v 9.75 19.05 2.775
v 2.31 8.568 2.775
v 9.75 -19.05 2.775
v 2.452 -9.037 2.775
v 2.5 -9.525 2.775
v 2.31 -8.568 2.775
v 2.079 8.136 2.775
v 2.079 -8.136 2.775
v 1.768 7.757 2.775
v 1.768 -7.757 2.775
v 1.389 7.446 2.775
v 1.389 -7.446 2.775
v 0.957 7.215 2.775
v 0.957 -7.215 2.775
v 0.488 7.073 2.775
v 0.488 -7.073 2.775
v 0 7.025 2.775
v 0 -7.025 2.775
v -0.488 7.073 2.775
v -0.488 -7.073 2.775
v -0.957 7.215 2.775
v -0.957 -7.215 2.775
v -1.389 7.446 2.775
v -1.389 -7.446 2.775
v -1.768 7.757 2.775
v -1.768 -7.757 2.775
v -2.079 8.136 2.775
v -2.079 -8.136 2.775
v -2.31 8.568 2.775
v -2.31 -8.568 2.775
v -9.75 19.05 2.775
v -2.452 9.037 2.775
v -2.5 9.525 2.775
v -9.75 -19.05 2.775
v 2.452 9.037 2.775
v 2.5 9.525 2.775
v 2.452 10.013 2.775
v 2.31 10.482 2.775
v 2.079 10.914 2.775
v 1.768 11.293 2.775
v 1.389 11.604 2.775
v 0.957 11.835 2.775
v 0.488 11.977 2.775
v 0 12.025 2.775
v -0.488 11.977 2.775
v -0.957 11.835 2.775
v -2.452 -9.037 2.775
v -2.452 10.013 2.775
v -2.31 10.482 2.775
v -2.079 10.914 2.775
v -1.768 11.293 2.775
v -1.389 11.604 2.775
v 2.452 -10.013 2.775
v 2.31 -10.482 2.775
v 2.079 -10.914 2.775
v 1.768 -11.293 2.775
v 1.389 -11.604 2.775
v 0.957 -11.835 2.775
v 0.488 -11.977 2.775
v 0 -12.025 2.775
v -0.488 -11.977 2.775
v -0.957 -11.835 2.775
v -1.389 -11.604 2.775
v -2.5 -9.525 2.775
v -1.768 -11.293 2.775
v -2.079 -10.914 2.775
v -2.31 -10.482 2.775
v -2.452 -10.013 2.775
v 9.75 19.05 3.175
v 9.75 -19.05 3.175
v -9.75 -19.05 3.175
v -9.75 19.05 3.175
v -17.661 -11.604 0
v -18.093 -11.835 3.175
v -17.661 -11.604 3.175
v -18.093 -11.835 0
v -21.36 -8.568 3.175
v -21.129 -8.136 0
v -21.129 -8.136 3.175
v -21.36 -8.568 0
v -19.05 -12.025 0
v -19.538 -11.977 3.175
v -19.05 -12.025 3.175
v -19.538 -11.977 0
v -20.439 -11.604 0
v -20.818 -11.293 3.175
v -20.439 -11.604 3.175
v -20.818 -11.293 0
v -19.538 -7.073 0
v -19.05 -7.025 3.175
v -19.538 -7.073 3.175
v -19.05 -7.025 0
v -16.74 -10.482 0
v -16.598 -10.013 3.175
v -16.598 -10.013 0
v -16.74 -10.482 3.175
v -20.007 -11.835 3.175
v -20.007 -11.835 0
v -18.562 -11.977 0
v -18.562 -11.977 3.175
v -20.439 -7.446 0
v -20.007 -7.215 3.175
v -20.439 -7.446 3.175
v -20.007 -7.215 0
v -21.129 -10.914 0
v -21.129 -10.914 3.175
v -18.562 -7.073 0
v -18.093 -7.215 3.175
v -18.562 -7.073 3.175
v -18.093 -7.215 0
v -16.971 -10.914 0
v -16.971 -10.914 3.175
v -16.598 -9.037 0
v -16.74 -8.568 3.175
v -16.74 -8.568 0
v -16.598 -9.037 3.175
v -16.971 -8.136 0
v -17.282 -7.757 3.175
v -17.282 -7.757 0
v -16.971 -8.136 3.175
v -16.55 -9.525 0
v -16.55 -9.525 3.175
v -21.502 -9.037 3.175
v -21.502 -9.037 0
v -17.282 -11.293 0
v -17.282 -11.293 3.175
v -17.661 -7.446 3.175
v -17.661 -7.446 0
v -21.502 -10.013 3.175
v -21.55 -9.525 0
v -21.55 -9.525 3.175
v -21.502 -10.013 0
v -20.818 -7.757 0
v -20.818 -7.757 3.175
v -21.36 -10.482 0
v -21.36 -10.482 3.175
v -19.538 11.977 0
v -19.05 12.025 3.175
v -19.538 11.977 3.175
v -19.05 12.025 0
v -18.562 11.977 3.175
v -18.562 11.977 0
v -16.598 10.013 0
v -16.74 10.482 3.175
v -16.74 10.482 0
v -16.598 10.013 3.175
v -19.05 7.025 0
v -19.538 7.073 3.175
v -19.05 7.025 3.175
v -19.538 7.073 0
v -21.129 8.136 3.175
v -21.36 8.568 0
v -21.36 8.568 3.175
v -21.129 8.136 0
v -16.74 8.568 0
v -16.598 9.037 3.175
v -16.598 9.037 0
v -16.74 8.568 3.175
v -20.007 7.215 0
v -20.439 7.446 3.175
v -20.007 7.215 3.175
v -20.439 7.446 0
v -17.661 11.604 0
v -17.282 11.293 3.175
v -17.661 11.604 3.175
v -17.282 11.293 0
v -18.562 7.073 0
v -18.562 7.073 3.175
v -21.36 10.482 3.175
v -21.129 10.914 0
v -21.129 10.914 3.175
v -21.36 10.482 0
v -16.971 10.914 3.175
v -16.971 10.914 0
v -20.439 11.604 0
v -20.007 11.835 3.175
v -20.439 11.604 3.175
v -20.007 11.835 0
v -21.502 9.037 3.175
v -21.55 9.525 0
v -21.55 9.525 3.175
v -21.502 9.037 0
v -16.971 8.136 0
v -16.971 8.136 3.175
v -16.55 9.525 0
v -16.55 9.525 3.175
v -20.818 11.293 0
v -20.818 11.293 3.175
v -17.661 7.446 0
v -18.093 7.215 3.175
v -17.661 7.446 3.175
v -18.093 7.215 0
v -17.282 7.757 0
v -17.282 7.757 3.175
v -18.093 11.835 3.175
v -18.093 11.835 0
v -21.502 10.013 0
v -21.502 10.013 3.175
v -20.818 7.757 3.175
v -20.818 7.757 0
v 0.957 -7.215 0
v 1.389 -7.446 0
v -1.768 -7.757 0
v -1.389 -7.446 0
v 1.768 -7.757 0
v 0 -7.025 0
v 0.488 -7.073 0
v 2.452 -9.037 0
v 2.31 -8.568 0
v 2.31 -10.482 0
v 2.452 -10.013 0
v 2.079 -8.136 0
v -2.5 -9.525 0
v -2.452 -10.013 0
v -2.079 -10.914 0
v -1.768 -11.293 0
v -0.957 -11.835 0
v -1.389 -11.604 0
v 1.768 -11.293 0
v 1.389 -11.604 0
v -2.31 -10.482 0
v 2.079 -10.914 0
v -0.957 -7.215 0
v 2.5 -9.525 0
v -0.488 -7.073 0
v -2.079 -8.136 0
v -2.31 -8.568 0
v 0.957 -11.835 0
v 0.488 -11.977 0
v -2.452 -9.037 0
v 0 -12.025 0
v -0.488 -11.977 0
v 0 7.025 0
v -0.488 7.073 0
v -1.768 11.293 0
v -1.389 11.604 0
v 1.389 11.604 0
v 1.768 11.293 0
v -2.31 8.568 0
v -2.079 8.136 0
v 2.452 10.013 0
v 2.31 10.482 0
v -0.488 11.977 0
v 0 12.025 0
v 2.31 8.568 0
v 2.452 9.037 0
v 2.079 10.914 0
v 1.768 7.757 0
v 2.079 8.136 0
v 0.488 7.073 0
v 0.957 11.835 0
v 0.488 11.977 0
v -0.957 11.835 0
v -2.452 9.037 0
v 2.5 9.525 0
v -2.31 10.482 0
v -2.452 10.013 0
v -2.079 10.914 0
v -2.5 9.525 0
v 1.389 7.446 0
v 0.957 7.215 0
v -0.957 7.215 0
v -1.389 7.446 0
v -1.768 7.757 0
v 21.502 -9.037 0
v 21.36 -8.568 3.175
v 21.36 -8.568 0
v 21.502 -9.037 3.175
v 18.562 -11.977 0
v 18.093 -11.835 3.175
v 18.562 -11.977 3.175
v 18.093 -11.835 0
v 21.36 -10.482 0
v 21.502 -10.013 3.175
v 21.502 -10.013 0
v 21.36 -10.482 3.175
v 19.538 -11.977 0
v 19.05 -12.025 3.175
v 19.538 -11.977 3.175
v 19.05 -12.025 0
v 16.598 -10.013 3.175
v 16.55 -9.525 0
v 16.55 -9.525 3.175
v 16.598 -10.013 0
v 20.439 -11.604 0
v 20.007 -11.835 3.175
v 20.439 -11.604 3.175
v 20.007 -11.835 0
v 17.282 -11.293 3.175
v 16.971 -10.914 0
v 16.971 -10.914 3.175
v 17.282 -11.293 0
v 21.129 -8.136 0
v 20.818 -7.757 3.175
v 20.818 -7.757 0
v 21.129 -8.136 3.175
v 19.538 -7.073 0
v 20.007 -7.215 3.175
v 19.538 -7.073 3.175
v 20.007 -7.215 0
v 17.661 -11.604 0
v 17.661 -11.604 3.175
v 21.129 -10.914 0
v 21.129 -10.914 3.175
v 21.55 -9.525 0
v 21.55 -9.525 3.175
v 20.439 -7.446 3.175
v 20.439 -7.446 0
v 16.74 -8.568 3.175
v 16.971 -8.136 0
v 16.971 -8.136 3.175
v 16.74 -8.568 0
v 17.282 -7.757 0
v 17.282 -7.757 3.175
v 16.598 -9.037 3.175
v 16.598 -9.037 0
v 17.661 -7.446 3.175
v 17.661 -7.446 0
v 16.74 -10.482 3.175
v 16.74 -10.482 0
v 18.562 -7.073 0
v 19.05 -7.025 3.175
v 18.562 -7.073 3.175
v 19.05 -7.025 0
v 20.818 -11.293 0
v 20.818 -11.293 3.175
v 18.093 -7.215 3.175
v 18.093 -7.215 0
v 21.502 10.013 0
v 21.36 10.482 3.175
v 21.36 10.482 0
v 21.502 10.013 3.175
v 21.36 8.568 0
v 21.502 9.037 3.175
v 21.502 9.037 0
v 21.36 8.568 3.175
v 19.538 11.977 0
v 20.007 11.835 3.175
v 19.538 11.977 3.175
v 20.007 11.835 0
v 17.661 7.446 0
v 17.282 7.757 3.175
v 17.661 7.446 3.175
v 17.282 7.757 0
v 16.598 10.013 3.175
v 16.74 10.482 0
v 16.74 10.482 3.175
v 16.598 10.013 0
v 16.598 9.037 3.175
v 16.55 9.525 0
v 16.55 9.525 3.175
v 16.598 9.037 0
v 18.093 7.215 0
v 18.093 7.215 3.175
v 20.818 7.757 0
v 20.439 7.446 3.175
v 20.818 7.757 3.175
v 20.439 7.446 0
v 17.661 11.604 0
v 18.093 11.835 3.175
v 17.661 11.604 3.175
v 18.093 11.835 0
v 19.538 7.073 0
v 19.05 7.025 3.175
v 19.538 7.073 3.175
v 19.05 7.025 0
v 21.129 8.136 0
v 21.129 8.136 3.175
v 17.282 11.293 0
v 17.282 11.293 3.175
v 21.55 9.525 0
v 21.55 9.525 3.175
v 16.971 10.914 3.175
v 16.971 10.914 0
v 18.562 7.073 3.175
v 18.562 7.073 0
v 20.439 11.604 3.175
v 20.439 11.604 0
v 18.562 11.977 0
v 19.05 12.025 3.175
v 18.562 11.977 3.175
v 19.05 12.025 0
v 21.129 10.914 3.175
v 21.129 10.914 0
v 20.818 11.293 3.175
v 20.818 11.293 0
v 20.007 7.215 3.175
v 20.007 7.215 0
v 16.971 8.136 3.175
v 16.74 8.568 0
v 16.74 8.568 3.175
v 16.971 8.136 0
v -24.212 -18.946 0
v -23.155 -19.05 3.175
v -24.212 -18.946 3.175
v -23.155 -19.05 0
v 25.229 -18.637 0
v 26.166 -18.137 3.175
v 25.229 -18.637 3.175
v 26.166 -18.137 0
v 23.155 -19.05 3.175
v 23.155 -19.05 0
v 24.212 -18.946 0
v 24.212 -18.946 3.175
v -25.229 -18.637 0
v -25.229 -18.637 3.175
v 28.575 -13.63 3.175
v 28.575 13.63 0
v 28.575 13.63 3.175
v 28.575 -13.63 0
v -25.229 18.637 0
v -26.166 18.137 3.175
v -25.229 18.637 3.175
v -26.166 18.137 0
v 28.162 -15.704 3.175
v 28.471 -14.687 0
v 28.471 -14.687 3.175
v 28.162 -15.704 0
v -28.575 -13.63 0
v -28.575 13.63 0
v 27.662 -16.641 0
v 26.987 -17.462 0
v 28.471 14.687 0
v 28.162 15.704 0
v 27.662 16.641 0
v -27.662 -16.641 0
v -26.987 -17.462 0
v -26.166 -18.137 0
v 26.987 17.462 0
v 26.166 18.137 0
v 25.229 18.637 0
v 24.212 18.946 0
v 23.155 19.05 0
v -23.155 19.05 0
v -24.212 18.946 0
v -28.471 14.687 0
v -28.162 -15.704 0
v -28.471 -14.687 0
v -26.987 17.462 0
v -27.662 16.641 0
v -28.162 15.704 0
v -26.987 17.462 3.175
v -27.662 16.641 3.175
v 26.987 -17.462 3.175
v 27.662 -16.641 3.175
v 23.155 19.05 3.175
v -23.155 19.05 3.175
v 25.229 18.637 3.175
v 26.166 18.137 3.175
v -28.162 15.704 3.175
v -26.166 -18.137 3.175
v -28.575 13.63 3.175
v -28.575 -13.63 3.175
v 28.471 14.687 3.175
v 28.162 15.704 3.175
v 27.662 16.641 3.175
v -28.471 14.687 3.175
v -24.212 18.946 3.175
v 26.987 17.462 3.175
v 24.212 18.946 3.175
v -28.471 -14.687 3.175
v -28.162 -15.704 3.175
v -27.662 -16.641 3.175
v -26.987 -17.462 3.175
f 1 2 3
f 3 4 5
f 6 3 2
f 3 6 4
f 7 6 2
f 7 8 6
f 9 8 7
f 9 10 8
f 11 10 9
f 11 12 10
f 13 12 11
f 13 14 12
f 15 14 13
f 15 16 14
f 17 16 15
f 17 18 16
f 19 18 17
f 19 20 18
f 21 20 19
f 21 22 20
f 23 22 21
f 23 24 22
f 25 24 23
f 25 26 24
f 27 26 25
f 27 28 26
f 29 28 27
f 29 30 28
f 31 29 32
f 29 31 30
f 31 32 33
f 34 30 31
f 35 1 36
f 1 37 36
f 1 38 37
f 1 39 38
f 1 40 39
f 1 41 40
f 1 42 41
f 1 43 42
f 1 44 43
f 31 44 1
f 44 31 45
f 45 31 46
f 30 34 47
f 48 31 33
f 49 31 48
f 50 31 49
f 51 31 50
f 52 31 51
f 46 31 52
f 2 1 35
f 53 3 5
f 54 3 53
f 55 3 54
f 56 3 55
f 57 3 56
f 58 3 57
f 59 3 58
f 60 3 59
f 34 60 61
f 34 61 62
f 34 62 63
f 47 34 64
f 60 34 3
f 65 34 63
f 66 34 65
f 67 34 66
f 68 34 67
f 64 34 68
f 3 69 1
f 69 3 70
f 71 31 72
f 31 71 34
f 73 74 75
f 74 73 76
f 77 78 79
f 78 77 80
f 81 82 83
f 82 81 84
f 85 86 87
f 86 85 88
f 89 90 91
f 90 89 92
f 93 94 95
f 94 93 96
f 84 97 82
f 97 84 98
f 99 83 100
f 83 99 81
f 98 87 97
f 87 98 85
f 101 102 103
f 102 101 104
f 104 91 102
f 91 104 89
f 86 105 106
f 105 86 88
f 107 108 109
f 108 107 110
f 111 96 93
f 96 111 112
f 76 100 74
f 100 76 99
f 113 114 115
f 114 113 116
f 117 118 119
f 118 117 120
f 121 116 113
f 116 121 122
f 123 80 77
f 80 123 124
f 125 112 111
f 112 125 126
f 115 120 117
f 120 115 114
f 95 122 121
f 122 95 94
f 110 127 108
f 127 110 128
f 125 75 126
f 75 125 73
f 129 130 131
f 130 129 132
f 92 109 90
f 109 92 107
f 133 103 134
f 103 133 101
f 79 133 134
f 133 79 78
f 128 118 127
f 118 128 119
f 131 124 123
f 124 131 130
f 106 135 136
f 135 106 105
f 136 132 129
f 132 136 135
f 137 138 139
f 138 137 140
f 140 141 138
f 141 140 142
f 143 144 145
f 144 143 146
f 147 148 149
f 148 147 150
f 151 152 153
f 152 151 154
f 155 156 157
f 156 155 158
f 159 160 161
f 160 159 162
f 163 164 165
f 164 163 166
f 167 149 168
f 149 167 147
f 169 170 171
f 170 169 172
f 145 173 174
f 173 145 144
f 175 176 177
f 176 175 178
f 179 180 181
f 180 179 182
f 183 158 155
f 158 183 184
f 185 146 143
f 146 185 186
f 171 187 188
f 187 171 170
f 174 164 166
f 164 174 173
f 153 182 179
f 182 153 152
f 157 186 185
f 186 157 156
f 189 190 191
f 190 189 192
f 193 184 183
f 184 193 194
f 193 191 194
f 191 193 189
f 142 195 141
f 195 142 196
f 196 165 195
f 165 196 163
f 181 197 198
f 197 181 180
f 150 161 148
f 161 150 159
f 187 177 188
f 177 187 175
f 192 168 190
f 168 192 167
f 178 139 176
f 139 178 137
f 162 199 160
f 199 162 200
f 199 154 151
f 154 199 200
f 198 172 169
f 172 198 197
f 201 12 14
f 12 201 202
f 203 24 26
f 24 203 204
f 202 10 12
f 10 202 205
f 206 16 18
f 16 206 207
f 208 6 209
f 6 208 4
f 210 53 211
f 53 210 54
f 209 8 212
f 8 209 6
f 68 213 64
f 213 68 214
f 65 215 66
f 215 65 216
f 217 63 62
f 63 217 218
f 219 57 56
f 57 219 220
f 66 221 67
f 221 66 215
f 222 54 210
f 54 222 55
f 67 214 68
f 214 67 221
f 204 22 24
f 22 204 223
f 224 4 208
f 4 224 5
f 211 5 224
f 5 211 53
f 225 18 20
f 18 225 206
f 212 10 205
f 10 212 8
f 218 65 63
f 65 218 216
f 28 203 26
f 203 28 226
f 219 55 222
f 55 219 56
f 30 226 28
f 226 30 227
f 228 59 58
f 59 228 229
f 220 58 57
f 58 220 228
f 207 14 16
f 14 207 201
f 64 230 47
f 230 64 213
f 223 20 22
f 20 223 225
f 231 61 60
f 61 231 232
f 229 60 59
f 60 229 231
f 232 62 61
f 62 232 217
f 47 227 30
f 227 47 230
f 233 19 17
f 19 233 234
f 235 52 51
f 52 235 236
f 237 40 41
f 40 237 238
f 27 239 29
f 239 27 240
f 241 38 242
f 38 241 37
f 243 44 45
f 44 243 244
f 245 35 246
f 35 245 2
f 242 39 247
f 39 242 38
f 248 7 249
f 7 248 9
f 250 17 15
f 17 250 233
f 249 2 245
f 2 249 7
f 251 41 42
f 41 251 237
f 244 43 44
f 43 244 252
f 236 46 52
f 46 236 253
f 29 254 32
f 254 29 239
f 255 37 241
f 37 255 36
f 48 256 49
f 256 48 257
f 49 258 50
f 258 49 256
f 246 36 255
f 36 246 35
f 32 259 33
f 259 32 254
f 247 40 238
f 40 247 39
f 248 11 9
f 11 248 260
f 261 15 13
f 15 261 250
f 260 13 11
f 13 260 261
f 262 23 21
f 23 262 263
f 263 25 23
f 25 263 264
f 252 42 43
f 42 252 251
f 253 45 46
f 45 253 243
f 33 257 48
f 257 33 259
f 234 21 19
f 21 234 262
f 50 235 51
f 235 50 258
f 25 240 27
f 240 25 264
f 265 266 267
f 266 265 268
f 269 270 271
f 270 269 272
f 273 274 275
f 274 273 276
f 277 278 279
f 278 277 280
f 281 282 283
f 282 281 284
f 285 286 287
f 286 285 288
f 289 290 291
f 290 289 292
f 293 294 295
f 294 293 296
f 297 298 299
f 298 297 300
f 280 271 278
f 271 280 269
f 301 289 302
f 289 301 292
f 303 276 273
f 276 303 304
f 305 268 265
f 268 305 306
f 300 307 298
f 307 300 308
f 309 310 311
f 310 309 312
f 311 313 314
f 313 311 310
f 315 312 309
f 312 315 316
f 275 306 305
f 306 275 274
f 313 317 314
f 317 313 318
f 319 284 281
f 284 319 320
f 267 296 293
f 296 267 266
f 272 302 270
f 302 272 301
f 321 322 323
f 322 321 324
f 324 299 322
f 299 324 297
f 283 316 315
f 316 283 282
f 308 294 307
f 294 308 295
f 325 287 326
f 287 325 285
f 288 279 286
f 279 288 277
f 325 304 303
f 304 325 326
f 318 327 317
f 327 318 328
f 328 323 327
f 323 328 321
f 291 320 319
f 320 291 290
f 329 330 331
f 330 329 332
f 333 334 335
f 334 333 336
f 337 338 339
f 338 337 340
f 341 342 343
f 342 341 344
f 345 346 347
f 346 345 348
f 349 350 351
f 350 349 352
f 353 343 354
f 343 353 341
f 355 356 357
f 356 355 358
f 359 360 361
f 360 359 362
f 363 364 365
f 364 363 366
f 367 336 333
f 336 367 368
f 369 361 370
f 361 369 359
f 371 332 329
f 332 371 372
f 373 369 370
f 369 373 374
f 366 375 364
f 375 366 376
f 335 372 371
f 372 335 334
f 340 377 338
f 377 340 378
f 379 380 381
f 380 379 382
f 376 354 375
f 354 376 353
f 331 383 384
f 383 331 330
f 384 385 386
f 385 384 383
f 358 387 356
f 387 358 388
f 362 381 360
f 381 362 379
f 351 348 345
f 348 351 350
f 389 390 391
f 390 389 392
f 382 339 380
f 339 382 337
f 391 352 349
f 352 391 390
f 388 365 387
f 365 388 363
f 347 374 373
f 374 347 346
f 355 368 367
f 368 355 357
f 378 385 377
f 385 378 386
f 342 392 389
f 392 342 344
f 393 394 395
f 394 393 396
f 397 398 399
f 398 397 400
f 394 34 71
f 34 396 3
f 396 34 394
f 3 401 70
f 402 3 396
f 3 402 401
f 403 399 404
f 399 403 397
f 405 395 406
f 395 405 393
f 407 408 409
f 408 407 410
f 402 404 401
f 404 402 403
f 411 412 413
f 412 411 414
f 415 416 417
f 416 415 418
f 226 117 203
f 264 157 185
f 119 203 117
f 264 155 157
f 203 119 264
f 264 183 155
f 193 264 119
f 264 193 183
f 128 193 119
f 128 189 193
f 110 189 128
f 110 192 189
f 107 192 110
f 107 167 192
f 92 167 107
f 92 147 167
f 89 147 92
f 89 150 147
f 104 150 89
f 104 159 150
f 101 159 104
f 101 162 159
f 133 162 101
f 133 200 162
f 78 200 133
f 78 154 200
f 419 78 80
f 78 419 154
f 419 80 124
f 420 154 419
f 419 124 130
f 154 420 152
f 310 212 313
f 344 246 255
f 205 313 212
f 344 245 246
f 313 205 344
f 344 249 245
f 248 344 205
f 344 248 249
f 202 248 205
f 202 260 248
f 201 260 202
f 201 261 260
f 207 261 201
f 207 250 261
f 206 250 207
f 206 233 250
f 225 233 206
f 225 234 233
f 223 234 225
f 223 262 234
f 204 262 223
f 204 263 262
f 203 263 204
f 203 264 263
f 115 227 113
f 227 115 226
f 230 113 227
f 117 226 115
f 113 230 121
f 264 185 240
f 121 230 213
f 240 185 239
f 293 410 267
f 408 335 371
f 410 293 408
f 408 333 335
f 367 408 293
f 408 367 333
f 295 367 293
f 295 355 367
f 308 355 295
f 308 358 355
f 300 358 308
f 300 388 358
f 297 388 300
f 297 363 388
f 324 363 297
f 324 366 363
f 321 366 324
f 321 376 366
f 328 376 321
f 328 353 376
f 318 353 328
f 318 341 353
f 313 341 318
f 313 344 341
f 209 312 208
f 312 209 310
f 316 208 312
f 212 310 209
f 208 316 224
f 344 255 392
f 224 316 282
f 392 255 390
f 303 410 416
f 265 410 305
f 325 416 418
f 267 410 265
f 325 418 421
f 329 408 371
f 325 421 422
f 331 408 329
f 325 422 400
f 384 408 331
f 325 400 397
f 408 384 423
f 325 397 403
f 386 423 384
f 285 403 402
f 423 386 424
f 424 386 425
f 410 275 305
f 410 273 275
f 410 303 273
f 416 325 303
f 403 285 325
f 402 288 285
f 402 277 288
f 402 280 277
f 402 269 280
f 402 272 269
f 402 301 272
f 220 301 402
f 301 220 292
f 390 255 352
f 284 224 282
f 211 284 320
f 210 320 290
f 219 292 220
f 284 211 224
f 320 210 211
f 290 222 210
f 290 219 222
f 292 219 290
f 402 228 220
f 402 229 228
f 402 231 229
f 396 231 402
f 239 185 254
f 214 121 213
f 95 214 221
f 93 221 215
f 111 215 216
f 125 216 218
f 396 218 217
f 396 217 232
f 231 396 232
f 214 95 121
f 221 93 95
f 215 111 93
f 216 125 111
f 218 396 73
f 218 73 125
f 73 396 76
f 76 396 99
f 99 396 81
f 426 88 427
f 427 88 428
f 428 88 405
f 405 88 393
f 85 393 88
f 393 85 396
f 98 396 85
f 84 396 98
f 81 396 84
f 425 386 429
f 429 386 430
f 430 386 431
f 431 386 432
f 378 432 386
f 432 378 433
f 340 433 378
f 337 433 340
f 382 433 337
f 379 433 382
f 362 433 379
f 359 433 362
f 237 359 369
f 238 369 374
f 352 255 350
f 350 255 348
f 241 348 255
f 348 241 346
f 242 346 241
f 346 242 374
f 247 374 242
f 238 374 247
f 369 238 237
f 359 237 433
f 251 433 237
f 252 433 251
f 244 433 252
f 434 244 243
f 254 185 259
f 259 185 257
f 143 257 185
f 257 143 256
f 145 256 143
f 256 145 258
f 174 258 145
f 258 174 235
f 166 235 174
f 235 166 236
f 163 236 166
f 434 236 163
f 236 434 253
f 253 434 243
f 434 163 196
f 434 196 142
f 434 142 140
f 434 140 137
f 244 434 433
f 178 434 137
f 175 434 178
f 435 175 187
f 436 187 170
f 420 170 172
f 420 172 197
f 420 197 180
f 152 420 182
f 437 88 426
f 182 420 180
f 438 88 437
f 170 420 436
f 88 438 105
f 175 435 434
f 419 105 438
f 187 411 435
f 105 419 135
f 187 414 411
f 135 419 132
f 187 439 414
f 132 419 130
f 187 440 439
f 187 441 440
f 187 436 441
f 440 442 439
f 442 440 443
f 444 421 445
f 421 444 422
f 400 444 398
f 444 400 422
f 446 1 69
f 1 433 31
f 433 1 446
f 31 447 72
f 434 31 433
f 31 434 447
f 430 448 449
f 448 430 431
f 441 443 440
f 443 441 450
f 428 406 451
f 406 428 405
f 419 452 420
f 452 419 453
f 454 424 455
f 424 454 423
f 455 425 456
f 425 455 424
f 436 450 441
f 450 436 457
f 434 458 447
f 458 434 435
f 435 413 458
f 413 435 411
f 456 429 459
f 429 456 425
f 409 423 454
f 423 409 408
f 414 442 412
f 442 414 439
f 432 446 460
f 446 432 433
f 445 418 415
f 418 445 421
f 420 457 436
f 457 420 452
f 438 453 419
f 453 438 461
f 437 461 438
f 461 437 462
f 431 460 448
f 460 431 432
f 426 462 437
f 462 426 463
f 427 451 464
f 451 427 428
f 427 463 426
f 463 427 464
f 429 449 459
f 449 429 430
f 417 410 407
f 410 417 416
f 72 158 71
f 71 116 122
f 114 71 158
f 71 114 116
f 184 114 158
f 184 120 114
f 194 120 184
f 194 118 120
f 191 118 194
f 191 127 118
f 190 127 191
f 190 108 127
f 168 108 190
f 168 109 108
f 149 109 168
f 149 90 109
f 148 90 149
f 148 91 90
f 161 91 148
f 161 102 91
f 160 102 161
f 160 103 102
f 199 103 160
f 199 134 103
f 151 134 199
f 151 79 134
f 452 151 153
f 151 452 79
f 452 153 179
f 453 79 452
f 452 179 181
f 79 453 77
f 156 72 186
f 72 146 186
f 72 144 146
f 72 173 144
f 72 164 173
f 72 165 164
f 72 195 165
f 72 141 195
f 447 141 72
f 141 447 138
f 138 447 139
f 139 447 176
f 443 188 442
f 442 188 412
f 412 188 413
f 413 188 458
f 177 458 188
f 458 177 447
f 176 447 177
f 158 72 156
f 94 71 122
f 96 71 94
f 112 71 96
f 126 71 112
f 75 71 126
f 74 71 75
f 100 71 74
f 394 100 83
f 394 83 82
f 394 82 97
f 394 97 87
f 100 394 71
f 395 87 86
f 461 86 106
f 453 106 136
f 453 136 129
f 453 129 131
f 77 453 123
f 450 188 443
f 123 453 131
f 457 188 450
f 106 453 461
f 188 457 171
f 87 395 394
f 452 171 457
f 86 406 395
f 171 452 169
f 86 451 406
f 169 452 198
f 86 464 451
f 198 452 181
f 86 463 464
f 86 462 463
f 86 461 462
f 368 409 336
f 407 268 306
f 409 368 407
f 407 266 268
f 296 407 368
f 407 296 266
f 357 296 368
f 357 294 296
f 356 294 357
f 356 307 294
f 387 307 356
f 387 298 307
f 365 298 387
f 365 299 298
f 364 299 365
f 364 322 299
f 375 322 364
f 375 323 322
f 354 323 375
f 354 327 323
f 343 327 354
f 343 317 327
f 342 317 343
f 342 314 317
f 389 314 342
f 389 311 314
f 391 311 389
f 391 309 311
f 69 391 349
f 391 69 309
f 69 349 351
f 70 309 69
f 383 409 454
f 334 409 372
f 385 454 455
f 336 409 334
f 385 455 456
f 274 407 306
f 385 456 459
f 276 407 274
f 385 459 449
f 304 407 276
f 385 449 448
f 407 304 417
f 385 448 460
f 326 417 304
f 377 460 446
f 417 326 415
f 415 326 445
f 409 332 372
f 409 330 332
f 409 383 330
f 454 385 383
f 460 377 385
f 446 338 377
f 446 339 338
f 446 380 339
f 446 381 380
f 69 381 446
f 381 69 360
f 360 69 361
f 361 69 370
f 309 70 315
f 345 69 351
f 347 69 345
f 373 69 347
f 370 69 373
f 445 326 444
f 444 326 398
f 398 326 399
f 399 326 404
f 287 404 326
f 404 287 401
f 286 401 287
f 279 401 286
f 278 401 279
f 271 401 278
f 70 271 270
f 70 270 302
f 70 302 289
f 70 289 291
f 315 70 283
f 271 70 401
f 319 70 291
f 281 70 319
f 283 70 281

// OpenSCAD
// file: ../lib/TOGComplexLib1.scad
function tcplx1_multiply(a, b) =
	[a[0]*b[0] - a[1]*b[1], a[0]*b[1] + a[1]*b[0]];
function tcplx1_divide(a, b) =
	let(bot = (b[0]*b[0] + b[1]*b[1]))
	[
		(a[0]*b[0] + a[1]*b[1])/bot,
		(a[1]*b[0] - a[0]*b[1])/bot
	];

assert([-11,23] == tcplx1_multiply([3,2], [1,7]));

assert([-1,3] == tcplx1_multiply([3,1], [0,1]));
assert([-1,3] == tcplx1_multiply([0,1], [3,1]));

echo(tcplx1_divide([-1,3], [3,1]));
assert([0,1] == tcplx1_divide([-1,3], [3,1]));

function tcplx1_normalize(vec) =
	let(veclen = sqrt(vec[0]*vec[0]+vec[1]*vec[1]))
	[vec[0] / veclen, vec[1] / veclen];

function tcplx1_relative_turnvec_vv(v0, v1) =
	tcplx1_divide(tcplx1_normalize(v1), tcplx1_normalize(v0));

function tcplx1_relative_turnvec_abc(p0, p1, p2) = tcplx1_relative_turnvec_vv(p1-p0, p2-p1);

// A 90-degree turn
assert([0,1] == tcplx1_relative_turnvec_abc([0,0], [1,0], [1,1]));
assert([0,1] == tcplx1_relative_turnvec_abc([0,0], [0,1], [-1,1]));

// A 45-degree turn
assert(tcplx1_normalize([1,1]) == tcplx1_relative_turnvec_abc([0,0], [1,0], [ 2,1]));
assert(tcplx1_normalize([1,1]) == tcplx1_relative_turnvec_abc([0,0], [0,1], [-1,2]));


function tcplx1_relative_angle_abc(p0, p1, p2) =
	let(turnvec = tcplx1_relative_turnvec_abc(p0, p1, p2))
	atan2(turnvec[1], turnvec[0]);

assert(-135 == tcplx1_relative_angle_abc([0,0], [1,0], [0,-1]));
assert( -90 == tcplx1_relative_angle_abc([0,0], [1,0], [1,-1]));
assert(   0 == tcplx1_relative_angle_abc([0,0], [1,0], [2, 0]));
assert(  90 == tcplx1_relative_angle_abc([0,0], [1,0], [1, 1]));
assert( 135 == tcplx1_relative_angle_abc([0,0], [1,0], [0, 1]));

assert(  90 == tcplx1_relative_angle_abc([1,1], [3,3], [1, 5]));
// file: ../lib/TOGArrayLib1.scad
// TOGArrayLib1.5
// 
// Functions for working with arrays.
// 
// v1.1:
// - tal1_reduce assert(is_list(items)) to prevent infinite recursion
//   when given undefined or other non-list values
// v1.1.1:
// - Fix tal1_uniq_remap_v2 to return "list-remap-result" as the
//   first element of the returned list
// v1.2:
// - Add tal1_replace_at function
// v1.3:
// - tal1_is_vec_of, tal1_is_vec_of_num
// v1.4:
// - tal1_assert_for_each, for when you want to assert something
//   about each of a list of items and get nice failure messages
// v1.5:
// - Add tal1_duplicate_reversed function, which may be
//   handy when generating symmetrical polygons and stuff.

/**
 * Make a list with the contents of list `a`,
 * but starting at offset `off`, replaced by the contents of list `b`.
 * len(result) = max(len(a), off+len(b))
 */
function tal1_replace_at(a, off, b, default_value=undef, default_value_function=undef) =
	assert(is_list(a))
	assert(is_list(b))
	let( _dvf = !is_undef(default_value_function) ? default_value_function : function(i) default_value )
[
	for( i=[0:1:min(off,len(a))-1] ) a[i],
	for( i=[len(a):1:off-1] ) _dvf(i),
	for( i=[off:1:off+len(b)-1] ) b[i-off],
	for( i=[off+len(b):1:len(a)-1] ) a[i],
];

// Simplest case
assert([] == tal1_replace_at([], 0, []));
// Second simplest cases
assert(["foo"] == tal1_replace_at(["foo"], 0, []));
assert(["foo"] == tal1_replace_at([], 0, ["foo"]));
// Replace one item
assert(["foo","quux","baz"] == tal1_replace_at(["foo","bar","baz"], 1, ["quux"]));
// Replace and extend
assert(["foo","quux","tuna","tina"] == tal1_replace_at(["foo","bar","baz"], 1, ["quux", "tuna", "tina"]));
// Add beyond end of `a`
assert(["foo","zzz","quux"] == tal1_replace_at(["foo"], 2, ["quux"], default_value="zzz"));
// Adding 'nothing' should still fill to that point with defaults
assert(["foo","zzz","zzz"] == tal1_replace_at(["foo"], 3, [], default_value="zzz"));


function tal1_reduce(start, items, func, offset=0) =
	assert(is_list(items))
	len(items) == offset ? start :
	tal1_reduce(func(start, items[offset]), items, func, offset+1);

function tal1_consecutive_duplicate_count(items) = tal1_reduce(
	[0, undef],
	items,
	function(z,item) [z[0] + (item == z[1] ? 1 : 0), item]
)[0];

assert(0 == tal1_consecutive_duplicate_count([]));
assert(0 == tal1_consecutive_duplicate_count([50]));
assert(1 == tal1_consecutive_duplicate_count([50,50]));
assert(0 == tal1_consecutive_duplicate_count([50,51,52,53]));
assert(1 == tal1_consecutive_duplicate_count([50,51,52,52]));
assert(3 == tal1_consecutive_duplicate_count([50,50,50,50]));

// Set test_size to arbirarily large values
// to ensure that OpenSCAD can handle heavy recursion
let(test_size=1000) assert(test_size/2 == tal1_consecutive_duplicate_count([for(i=[0:1:test_size-1]) floor(i/2)]));



function tal1_uniq_(items, off0, off1) =
	let(chunklen = off1-off0)
	chunklen == 0 ? [] :
	chunklen == 1 ? [items[off0]] :
	let(half=floor(chunklen/2))
	let(left  = tal1_uniq_(items, off0     , off0+half))
	let(right = tal1_uniq_(items, off0+half, off1     ))
	assert(len(left) > 0)
	assert(len(right) > 0)
	left[len(left)-1] == right[0] ? [each left, for(i=[1:1:len(right)-1]) right[i]] :
	[each left, each right];

/** Given a list of items, returns a new list with identical consecutive items merged */
function tal1_uniq(items) = tal1_uniq_(items, 0, len(items));

assert([] == tal1_uniq([]));
assert([123] == tal1_uniq([123]));
assert([55,0,1,2,3] == tal1_uniq([55,0,1,2,3]));
assert([55,0,1,2] == tal1_uniq([55,0,1,1,2]));
assert([55,0,1] == tal1_uniq([55,55,0,0,0,0,0,0,1,1,1,1]));
assert([55,0] == tal1_uniq([55,0,0,0,0,0,0,0]));



/**
 * Returns [new items, old index -> new index mapping].
 * No-op version.
 */
function tal1_uniq_remap_v1(items) =
	["list-remap-result", items, [for (vi=[0:1:len(items)-1]) vi]];

// [a, a, b, b, c, c]
//
// [a,    ...], []  -> [a],[0]
// [a, a, ...], [0] -> [a],[0,0]

assert([1,2,3] == [1,2,3]);

/**
 * Recursive version that will combine adjacent identical vertexes,
 * but will use the original items.
 */
function tal1_uniq_remap_v2(items, map=[]) =
	let(index = len(map))
	len(items) == index ? ["list-remap-result", items, map] :
	index == 0 ? tal1_uniq_remap_v2(items, [0]) :
	items[index] == items[map[index-1]] ? tal1_uniq_remap_v2(items, [for(vi=map) vi, map[index-1]]) :
	tal1_uniq_remap_v2(items, [for(vi=map) vi, index]);

assert(tal1_uniq_remap_v2([1,1,2,2,3,4]) == ["list-remap-result", [1,1,2,2,3,4], [0,0,2,2,4,5]]);


/**
 * Returns true if `vec` is a list of at least min_len items
 * and component_check(each item, even those beyond min_len) is true.
 */
function tal1_is_vec_of(vec, min_len=0, component_check=function(x) true) =
	assert(is_num(min_len) && min_len >= 0)
	assert(is_function(component_check))
	is_list(vec) && len(vec) >= min_len &&
	tal1_reduce(true, vec, function(prev,item) prev && component_check(item));

function tal1_is_vec_of_num(vec, min_len=0) = tal1_is_vec_of(vec, min_len, function(i) is_num(i));

assert( true == tal1_is_vec_of_num([1,2,3]));
assert( true == tal1_is_vec_of_num([]));
assert( true == tal1_is_vec_of_num([1,2,3], 3));
assert(false == tal1_is_vec_of_num([1,2], 3));
assert(false == tal1_is_vec_of_num([1,2,"spoon"], 3));
// Requirements are ambiguous when
// first min_len items are numbers, but there are non-numeric items afterwards,
// so let's error on the side of saying 'no, it's not a list of numbers';
// i.e. the item check and the min_len are independent.
assert(false == tal1_is_vec_of_num([1,2,3,"artichoke"], 3));


/**
 * Asserts that item_checker(each item in list, index of item)[0] is true.
 * Second element of item_checker return value is assertion message.
 * Returns the original list, in case that's useful to you.
 */
function tal1_assert_for_each(list, item_checker) =
	let( _ignored = [ for(i=[0:1:len(list)-1])
		let(q=item_checker(list[i],i))
		let(passed=is_bool(q) ? q : is_list(q) ? q[0] : assert(false, str(
			"tal1_assert_for_each: item_checker should return Bool|[Bool,String], but returned ",
			q, " for item at index ", i)))
		let(message=is_list(q) ? q[1] : undef)
		assert(passed, message)
		q
	])
	list;

// Callback can return a boolean...
assert([1,2,3] == tal1_assert_for_each([1,2,3], function(v,i) is_num(v)));
// ...or a [boolean, string]
assert([1,2,3] == tal1_assert_for_each([1,2,3], function(v,i) [is_num(v), "element be a num"]));

// [a, b, c] -> [a, b, c, rxf(c), rxf(b), rxf(a)]
function tal1_duplicate_reversed(list, rxf=function(item) item) =
	[
		each list,
		for( i=[len(list)-1 : -1 : 0] ) rxf(list[i]),
	];
// file: ../lib/TOGMod1Constructors.scad
// TOGMod1Constructors-v1.11
// 
// Functions to construct objects understood by TOGMod1
// 
// v1.1:
// - Add togmod1_make_rounded_rect
// v1.2:
// - togmod1_make_rounded_rect can make ovals
// v1.3:
// - togmod1_circle_points, to just get the points of a circle
// - if pos parameter to circle function has a third element,
//   returned vertexes will include it as the z component;
// v1.3.1
// - Some assertions
// v1.4:
// - Refactor togmod1_rounded_rect_points and togmod1_circle_points
//   to use togmod1__make_nd_vector_adder for adapting to whatever
//   `pos` parameter is.
// v1.5:
// - togmod_rounded_rect_points will not simplify completely rounded sides
//   (where length of side is exactly twice the rounding radius)
//   unless simplify_rounded_sides=true
//   - This makes it more useful for polyhedron generation,
//     where radius varies, but number of points must remain constant.
// v1.6:
// - togmod1_make_rect makes a simple rectangle
// - togmod1_make_rounded_rect will defer to togmod1_make_rect when r=0
// v1.7:
// - togmod1_make_circle will return empty shape (["union"]) when d=0
// v1.8:
// - Add togmod1_text
// v1.9:
// - togmod1_circle_points uses 3 as minimum circle point count instead of 6
// v1.10:
// - Fix togmod1_linear_extrude_y so that range corresponds to Y start/end and
//   polygon X,Y correspond to X,Z.  Previously it was rotated wrongly,
//   which would have gone unnoticed for symmetrical shapes centered at 0,0.
// v1.11:
// - Remove an 'echo'

use <./TOGArrayLib1.scad>

function togmod1__make_nd_vector_adder(origin=[0,0]) =
	let(origin_is_zero = tal1_reduce(true, origin, function(prev,item) prev && item == 0))
	origin_is_zero ? (function(vec) len(vec) >= len(origin) ? vec : tal1_replace_at(origin, 0, vec)) :
	function(vec) [
		for(i=[0:1:max(len(origin),len(vec))-1]) (len(vec) > i ? vec[i] : 0) + (len(origin) > i ? origin[i] : 0),
	];

assert([1,2,3] == togmod1__make_nd_vector_adder()([1,2,3]));
assert([1,2,3] == togmod1__make_nd_vector_adder([0,0,3])([1,2]));


function togmod1_make_cuboid(size) =
	assert(is_list(size))
	assert(len(size) >= 3)
	assert(is_num(size[0]))
	assert(is_num(size[1]))
	assert(is_num(size[2]))
	["polyhedron-vf", [
		[-size[0]/2, -size[1]/2, -size[2]/2],
		[+size[0]/2, -size[1]/2, -size[2]/2],
		[-size[0]/2, +size[1]/2, -size[2]/2],
		[+size[0]/2, +size[1]/2, -size[2]/2],
		[-size[0]/2, -size[1]/2, +size[2]/2],
		[+size[0]/2, -size[1]/2, +size[2]/2],
		[-size[0]/2, +size[1]/2, +size[2]/2],
		[+size[0]/2, +size[1]/2, +size[2]/2]
	], [
		[0,1,3,2],[0,4,5,1],[4,6,7,5],[3,7,6,2],[1,5,7,3],[6,4,0,2]
	]];

function togmod1_make_polygon(verts) =
	["polygon-vp", verts, [[for( i=[0:1:len(verts)-1] ) i%len(verts)]]];

function togmod1_rounded_rect_points(size, r, pos=[0,0], simplify_rounded_sides=false) =
	assert(is_list(size))
	assert(len(size) >= 2)
	let(radii = is_list(r) ? r : is_num(r) ? [r,r] : assert(false, "rounded_rect r(adius) should be list<num> or num"))
	let(rx = radii[0])
	let(ry = radii[1])
	assert(is_num(rx))
	assert(is_num(ry))
	assert(size[0] >= 2*rx, str("size[0] must be >= 2*r[0]; size[0] = ",size[0],", 2*r[0] = ",2*rx))
	assert(size[1] >= 2*ry, str("size[1] must be >= 2*r[1]; size[1] = ",size[1],", 2*r[1] = ",2*ry))
	let(quarterfn=max($fn/4, 1))
	let(qfnx = simplify_rounded_sides && size[0] == 2*rx ? quarterfn-1 : quarterfn)
	let(qfny = simplify_rounded_sides && size[1] == 2*ry ? quarterfn-1 : quarterfn)
	let(finalizepos = togmod1__make_nd_vector_adder(pos))
[
	for(a=[0 : 1 : qfnx]) let(ang=      a*90/quarterfn) finalizepos([ size[0]/2-rx + rx*cos(ang),  size[1]/2-ry + ry*sin(ang)]),
	for(a=[0 : 1 : qfny]) let(ang= 90 + a*90/quarterfn) finalizepos([-size[0]/2+rx + rx*cos(ang),  size[1]/2-ry + ry*sin(ang)]),
	for(a=[0 : 1 : qfnx]) let(ang=180 + a*90/quarterfn) finalizepos([-size[0]/2+rx + rx*cos(ang), -size[1]/2+ry + ry*sin(ang)]),
	for(a=[0 : 1 : qfny]) let(ang=270 + a*90/quarterfn) finalizepos([ size[0]/2-rx + rx*cos(ang), -size[1]/2+ry + ry*sin(ang)]),
];

function togmod1_make_rect(size) =
	togmod1_make_polygon([
		[-size[0]/2, -size[1]/2],
		[+size[0]/2, -size[1]/2],
		[+size[0]/2, +size[1]/2],
		[-size[0]/2, +size[1]/2],
	]);

function togmod1_make_rounded_rect(size, r) =
	r == 0 ? togmod1_make_rect(size) :
	togmod1_make_polygon(togmod1_rounded_rect_points(size,r,simplify_rounded_sides=true));

/**
 * Returns points for an approximation of a circle where points are at distance r from pos.
 * Can be used to make other regular polygons, but the faces will be less than that
 * distance from pos (do some trig if you want face distance, e.g. for a hex nut).
 */
function togmod1_circle_points(r, pos=[0,0], d=undef) =
	assert( !is_undef(r) || !is_undef(d) )
	assert(!is_undef(pos[0]))
	assert(!is_undef(pos[1]))
	let(finalizepos = togmod1__make_nd_vector_adder(pos))
	let(r_ = !is_undef(r) ? r : d/2)
	let(fn = max($fn, 3))
	[for(i=[0 : 1 : fn-1]) finalizepos([r_*cos(i*360/fn), r_*sin(i*360/fn)])];

function togmod1_make_circle(r, pos=[0,0], d=undef) =
	r == 0 || d == 0 ? ["union"] :
	togmod1_make_polygon(togmod1_circle_points(r=r, pos=pos, d=d));

function togmod1_make_cylinder(d, zrange=[0,1], r=undef, pos=[0,0]) =
	assert( !is_undef(r) || !is_undef(d) )
	let( r_ = !is_undef(r) ? r : d/2 )
	// TODO: Make polyhedron directly
	["linear-extrude-zs", zrange, togmod1_make_circle(r=r_, pos=pos)];

function togmod1__is_range1d(range) = is_list(range) && len(range) == 2 && is_num(range[0]) && is_num(range[1]);

function togmod1_linear_extrude_z(range, shape) =
	assert(togmod1__is_range1d(range))
	["linear-extrude-zs", range, shape];
function togmod1_linear_extrude_x(range, shape) =
	assert(togmod1__is_range1d(range))
	["rotate", [90, 0, 90], togmod1_linear_extrude_z(range, shape)];
function togmod1_linear_extrude_y(range, shape) =
	assert(togmod1__is_range1d(range))
	["rotate", [90, 0,  0], togmod1_linear_extrude_z([-range[1], -range[0]], shape)];

function togmod1_text(text, size, font, halign, valign, spacing, direction, language, script) =
	["text-tsfhvsdls", text, size, font, halign, valign, spacing, direction, language, script];
// file: ../lib/TOGMod1.scad
// TOGMod1.9
// OpenSCAD library for representing shapes
// 
// See also: Functional OpenSCAD (https://github.com/thehans/FunctionalOpenSCAD)
// 
// v1.8:
// - Add `text-tsfhvsdls`
// v1.9
// - Add `offset-ds` (offset with _d_elta a _s_hape)

module togmod1_domodule(mod) {
	assert(is_list(mod));
	assert(len(mod) > 0);
	if( mod[0] == "polygon-vp" ) {
		// ["polygon-vp", vertexes, paths]
		polygon(points=mod[1], paths=mod[2]);
	} else if( mod[0] == "polyhedron-vf" ) {
		polyhedron(mod[1], faces=mod[2]);
	} else if( mod[0] == "scale" ) {
		assert(len(mod) == 3);
		scale(mod[1]) togmod1_domodule(mod[2]);
	} else if( mod[0] == "translate" ) {
		assert(len(mod) == 3);
		assert(is_list(mod[1]));
		for(c=mod[1]) assert(is_num(c), "translate component should be numeric");
		translate(mod[1]) togmod1_domodule(mod[2]);
	} else if( mod[0] == "rotate" ) {
		assert(len(mod) == 3);
		rotate(mod[1]) togmod1_domodule(mod[2]);
	} else if( mod[0] == "intersection" ) {
		intersection_for( i=[1:1:len(mod)-1] ) togmod1_domodule(mod[i]);
	} else if( mod[0] == "difference" ) {
		difference() {
			togmod1_domodule(mod[1]);
			for( i=[2:1:len(mod)-1] ) togmod1_domodule(mod[i]);
		}
	} else if( mod[0] == "union" ) {
		for( i=[1:1:len(mod)-1] ) togmod1_domodule(mod[i]);
	} else if( mod[0] == "hull" ) {
		hull() for( i=[1:1:len(mod)-1] ) togmod1_domodule(mod[i]);
	} else if( mod[0] == "offset-rs" ) {
		assert(len(mod) == 3);
		assert(is_num(mod[1]));
		assert(is_list(mod[2]));
		offset(mod[1]) togmod1_domodule(mod[2]);
	} else if( mod[0] == "linear-extrude-zs" ) {
		// ["linear-extrude-zs", [z0,z1], 2d_shape] // centered
		// ["linear-extrude-zs", height, 2d_shape]
		let( zrange = is_list(mod[1]) ? mod[1] : [-mod[1]/2, mod[1]/2] ) {
			translate([0,0,zrange[0]]) linear_extrude(zrange[1]-zrange[0]) togmod1_domodule(mod[2]);
		}
	} else if( mod[0] == "render" ) {
		render() togmod1_domodule(mod[1]);
	} else if( mod[0] == "minkowski" ) {
		minkowski() {
			togmod1_domodule(mod[1]);
			togmod1_domodule(mod[2]);
		}
	} else if( mod[0] == "x-debug" ) {
		# togmod1_domodule(mod[1]);
	} else if( mod[0] == "x-color" ) {
		color(mod[1]) togmod1_domodule(mod[2]);
	} else if( mod[0] == "text-tsfhvsdls" ) {
		text(text=mod[1], size=mod[2], font=mod[3], halign=mod[4], valign=mod[5], spacing=mod[6], direction=mod[7], language=mod[7], script=mod[8]);
	} else if( mod[0] == "offset-ds" ) {
		assert(is_num(mod[1]));
		assert(is_list(mod[2]));
		offset(delta=mod[1]) togmod1_domodule(mod[2]);
	} else {
		assert(false, str("Unrecognized shape: ", mod[0]));
	}
}
// main file
// RazorHolder1.0
// 
// For holding one of these 3/4" wide razor blades
// by clamping down on it.

use <../lib/TOGMod1.scad>
use <../lib/TOGMod1Constructors.scad>
use <../lib/TOGPath1.scad>
use <../lib/TOGPolyhedronLib1.scad>

main_thickness = 3.175;
pocket_depth = 0.4;
pocket_width = 19.5;
std_round = (sqrt(2)/2+1) * 3.175; // 1.707 * bevel size

$fn = 32;

togmod1_domodule(
	let(baf = 19.05)
	let(hole = tphl1_make_z_cylinder(d=5, zrange=[-50,50]))
	["difference",
		togmod1_linear_extrude_z([0, main_thickness],
		   togmod1_make_rounded_rect([3*baf, 2*baf], r=std_round)),
		togmod1_linear_extrude_z([main_thickness - pocket_depth, main_thickness + pocket_depth],
			togmod1_make_rect([pocket_width, 3*baf])),
		for( xm=[-1,0,1] ) for( ym=[-0.5, 0.5] ) ["translate", [xm*baf, ym*baf], hole],
	]
);
